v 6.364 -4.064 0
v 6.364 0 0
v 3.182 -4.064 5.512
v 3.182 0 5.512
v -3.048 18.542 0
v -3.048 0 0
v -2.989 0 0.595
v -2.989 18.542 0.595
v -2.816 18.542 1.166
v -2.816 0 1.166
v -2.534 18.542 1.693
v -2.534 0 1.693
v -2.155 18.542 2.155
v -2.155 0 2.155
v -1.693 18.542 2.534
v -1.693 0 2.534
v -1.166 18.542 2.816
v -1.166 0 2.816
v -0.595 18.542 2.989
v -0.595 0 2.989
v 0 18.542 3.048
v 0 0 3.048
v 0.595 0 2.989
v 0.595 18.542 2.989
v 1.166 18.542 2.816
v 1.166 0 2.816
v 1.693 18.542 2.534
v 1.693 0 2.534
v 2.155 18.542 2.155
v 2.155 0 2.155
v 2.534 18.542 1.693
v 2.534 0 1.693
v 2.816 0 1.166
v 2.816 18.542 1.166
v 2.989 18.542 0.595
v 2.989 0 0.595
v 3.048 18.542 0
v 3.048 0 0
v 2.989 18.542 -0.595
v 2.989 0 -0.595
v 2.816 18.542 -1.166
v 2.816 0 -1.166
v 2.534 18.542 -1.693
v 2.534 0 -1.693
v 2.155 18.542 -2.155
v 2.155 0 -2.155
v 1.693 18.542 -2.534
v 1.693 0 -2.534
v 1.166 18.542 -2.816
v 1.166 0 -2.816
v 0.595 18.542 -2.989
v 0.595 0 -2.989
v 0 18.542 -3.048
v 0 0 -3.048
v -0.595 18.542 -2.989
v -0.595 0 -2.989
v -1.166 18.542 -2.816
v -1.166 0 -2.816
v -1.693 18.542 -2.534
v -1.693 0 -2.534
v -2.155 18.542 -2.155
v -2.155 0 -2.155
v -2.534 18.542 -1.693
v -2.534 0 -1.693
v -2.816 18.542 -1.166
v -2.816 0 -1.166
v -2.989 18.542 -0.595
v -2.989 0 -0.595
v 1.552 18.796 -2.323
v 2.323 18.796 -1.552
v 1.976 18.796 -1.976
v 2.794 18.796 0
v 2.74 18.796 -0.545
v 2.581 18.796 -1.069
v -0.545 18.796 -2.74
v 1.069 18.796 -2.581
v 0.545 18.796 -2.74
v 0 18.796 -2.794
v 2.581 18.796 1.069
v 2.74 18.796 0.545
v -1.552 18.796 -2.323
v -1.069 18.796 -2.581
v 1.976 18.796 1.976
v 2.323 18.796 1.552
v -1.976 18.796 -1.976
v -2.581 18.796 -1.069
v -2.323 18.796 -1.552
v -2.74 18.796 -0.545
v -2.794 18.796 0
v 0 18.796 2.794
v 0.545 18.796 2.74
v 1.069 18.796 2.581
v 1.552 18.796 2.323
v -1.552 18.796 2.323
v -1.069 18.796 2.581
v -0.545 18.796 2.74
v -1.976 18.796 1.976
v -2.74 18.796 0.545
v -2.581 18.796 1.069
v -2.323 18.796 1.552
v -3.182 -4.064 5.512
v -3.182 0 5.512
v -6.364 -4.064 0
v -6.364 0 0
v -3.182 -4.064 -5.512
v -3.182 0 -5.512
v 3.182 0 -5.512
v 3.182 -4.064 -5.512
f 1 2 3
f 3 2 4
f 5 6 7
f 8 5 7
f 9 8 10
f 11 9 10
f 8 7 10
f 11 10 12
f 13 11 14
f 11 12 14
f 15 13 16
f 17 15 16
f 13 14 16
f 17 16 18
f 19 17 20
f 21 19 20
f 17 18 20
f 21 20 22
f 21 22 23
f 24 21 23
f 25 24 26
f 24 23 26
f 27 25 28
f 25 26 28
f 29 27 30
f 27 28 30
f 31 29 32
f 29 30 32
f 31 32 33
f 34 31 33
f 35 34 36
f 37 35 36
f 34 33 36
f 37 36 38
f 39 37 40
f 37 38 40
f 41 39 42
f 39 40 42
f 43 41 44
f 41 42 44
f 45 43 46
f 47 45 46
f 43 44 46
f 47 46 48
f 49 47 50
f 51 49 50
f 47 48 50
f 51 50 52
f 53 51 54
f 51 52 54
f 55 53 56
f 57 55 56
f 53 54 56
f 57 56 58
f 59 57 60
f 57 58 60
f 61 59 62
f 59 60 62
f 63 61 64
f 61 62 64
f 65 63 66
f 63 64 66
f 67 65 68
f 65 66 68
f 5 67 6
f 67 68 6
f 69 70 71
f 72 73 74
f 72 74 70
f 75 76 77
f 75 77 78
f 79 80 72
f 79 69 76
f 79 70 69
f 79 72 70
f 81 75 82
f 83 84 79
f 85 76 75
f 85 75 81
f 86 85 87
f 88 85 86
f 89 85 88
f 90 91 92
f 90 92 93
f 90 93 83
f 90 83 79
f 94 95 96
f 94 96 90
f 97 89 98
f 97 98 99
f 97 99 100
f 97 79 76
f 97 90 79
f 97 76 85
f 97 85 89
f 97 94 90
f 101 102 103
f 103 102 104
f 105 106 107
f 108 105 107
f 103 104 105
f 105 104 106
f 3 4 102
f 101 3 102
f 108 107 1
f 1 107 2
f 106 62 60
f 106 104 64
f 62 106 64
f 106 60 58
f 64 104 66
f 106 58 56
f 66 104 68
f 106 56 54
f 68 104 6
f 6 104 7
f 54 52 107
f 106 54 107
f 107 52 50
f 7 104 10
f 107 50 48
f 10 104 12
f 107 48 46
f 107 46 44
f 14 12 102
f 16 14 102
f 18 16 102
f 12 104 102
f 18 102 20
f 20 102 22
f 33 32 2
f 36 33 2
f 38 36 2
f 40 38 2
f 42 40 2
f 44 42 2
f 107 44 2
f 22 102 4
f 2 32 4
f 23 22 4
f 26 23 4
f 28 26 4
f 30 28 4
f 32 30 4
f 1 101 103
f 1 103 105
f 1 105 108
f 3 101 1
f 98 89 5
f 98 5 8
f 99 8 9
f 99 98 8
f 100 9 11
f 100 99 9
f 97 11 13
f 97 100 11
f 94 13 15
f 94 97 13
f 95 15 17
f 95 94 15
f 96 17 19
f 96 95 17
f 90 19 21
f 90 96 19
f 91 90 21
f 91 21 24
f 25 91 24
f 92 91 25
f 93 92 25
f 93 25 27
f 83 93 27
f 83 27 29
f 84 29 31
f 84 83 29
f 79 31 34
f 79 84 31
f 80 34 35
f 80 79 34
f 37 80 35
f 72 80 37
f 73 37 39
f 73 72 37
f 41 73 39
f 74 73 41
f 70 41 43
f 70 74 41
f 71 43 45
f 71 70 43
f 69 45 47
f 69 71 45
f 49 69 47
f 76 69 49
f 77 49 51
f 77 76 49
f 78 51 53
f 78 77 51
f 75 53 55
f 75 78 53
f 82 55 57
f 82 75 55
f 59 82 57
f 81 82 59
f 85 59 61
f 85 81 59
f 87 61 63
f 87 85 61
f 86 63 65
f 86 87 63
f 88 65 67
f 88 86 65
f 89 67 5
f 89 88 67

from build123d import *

# Parameters (mm, degrees)
F1_DEPTH = 4.064
F2_R     = 3.048
F3_DEPTH = 18.796
F4_SIZE  = 0.254


with BuildPart() as f1:
    # F0 (on Front) → F1 (new body)
    with BuildSketch(Plane.XZ):
        Polygon((3.182239, 5.5118), (-3.182239, 5.5118), (-6.364478, 0), (-3.182239, -5.5118), (3.182239, -5.5118), (6.364478, 0), align=None)
    extrude(amount=F1_DEPTH)

    # F2 (on face) → F3 (join)
    with BuildSketch(Plane(origin=(0, 0, 0), x_dir=(-1, 0, 0), z_dir=(0, 1, 0))):
        Circle(F2_R)
    extrude(amount=F3_DEPTH)

    # F4
    f4_edges = [f1.edges().sort_by_distance(p)[0] for p in [
        (3.048, 18.796, 0),
    ]]
    chamfer(f4_edges, length=F4_SIZE)


solid = f1.part
